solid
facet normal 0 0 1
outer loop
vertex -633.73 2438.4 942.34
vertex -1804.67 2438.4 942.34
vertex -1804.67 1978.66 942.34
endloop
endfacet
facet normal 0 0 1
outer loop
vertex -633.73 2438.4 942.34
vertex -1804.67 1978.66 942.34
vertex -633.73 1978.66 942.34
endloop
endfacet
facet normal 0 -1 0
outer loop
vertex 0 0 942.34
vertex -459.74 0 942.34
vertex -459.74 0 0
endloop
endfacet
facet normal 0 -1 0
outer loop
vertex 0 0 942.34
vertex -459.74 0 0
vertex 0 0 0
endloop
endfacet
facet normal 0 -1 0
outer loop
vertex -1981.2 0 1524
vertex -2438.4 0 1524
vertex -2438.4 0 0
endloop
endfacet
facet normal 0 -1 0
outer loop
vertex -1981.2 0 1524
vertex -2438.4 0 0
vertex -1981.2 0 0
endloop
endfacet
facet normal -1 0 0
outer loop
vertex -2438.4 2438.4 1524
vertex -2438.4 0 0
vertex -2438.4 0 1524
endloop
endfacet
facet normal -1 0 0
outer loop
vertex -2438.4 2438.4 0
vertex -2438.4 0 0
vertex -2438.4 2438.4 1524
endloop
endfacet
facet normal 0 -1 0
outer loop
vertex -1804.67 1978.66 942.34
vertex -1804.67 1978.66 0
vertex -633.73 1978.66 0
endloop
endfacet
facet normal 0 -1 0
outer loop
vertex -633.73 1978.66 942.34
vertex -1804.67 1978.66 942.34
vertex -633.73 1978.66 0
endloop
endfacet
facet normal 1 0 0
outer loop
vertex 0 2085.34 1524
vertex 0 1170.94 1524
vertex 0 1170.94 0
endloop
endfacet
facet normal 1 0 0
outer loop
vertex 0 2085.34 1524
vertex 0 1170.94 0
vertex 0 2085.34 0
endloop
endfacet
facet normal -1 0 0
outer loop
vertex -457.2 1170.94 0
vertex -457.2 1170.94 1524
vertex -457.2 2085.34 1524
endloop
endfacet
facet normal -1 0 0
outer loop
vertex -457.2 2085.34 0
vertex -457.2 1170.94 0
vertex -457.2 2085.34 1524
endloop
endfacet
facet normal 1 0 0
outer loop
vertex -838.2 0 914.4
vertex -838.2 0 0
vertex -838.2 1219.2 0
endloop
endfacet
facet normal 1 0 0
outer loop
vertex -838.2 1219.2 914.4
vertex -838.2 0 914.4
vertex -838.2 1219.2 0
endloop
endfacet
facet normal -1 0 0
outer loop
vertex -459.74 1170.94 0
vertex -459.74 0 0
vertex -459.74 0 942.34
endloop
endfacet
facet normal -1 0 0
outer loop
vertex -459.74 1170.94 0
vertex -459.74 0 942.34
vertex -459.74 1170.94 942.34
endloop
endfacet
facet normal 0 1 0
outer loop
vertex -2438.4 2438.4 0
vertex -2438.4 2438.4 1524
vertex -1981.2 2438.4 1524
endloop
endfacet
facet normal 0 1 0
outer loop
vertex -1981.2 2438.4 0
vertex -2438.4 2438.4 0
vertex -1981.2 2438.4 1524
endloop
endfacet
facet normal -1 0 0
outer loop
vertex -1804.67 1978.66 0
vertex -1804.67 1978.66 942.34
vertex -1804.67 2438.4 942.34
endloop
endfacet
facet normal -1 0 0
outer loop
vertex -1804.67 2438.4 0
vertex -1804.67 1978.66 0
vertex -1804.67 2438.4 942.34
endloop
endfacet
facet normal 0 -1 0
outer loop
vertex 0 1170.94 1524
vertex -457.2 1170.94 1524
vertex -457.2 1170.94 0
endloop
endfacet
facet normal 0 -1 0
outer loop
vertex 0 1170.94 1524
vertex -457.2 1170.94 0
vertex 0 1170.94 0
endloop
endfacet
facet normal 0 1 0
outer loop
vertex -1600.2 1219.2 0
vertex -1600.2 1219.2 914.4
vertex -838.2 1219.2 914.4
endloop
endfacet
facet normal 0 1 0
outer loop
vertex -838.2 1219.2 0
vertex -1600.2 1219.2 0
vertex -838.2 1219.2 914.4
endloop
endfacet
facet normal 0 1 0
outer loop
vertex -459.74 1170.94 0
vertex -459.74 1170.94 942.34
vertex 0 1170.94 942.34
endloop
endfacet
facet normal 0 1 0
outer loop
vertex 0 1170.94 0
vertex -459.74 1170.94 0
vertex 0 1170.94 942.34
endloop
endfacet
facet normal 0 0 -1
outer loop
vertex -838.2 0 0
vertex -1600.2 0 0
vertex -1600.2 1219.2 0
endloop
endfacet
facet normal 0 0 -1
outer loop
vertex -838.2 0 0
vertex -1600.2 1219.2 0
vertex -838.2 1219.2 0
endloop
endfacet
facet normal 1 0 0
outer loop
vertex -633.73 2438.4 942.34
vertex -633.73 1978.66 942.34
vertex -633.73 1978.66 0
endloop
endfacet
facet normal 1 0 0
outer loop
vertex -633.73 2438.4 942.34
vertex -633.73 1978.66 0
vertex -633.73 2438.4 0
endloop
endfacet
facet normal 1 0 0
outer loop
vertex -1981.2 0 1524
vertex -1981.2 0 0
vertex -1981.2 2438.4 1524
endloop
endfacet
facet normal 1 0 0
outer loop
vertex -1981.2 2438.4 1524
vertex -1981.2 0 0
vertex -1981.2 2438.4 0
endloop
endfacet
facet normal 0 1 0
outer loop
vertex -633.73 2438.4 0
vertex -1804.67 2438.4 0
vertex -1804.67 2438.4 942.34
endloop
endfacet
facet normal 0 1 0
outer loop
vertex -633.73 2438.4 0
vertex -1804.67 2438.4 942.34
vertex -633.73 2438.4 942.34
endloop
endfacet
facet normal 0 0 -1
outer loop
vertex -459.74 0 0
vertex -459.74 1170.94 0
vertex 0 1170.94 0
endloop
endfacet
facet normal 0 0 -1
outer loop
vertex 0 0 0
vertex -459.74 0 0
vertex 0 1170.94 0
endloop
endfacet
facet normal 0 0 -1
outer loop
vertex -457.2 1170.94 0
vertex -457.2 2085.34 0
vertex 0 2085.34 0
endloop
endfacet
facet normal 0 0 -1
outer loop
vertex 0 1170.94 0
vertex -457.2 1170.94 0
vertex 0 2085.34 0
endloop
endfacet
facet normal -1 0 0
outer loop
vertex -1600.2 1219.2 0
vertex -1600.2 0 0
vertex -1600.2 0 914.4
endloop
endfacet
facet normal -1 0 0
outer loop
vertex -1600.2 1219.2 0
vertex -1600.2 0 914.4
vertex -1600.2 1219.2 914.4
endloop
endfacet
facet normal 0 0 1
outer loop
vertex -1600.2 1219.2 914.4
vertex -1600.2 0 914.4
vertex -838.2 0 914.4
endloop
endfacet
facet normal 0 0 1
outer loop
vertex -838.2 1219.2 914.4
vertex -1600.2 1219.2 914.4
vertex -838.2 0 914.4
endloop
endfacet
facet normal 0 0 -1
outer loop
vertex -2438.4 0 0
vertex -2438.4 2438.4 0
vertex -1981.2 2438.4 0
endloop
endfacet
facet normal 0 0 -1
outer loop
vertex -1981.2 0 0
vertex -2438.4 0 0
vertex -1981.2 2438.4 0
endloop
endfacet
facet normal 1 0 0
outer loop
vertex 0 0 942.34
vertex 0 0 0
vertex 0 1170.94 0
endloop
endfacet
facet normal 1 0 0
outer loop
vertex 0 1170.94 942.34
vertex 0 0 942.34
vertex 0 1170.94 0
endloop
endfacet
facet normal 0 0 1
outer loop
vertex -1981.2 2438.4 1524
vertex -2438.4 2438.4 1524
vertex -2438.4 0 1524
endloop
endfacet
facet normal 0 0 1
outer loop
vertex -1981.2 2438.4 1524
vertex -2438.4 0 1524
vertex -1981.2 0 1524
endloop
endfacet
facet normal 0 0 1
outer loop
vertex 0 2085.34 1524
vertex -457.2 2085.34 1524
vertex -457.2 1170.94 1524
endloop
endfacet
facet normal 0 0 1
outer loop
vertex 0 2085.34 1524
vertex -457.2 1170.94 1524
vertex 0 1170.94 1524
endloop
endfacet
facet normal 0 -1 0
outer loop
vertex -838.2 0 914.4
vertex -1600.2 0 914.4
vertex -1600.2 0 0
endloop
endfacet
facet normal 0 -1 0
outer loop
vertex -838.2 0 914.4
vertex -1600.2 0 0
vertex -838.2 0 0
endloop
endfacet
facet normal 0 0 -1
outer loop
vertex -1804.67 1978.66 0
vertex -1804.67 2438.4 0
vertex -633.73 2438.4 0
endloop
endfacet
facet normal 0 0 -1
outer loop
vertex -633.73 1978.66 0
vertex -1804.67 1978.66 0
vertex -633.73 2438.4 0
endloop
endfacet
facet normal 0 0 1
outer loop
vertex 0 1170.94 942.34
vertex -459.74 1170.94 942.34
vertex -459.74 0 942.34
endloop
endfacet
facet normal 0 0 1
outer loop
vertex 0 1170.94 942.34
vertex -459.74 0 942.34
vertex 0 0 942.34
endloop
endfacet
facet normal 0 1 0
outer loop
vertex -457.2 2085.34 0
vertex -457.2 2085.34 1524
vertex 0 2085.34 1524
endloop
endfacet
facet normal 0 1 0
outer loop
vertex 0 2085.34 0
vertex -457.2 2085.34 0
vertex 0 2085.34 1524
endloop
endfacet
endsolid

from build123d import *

# Parameters (mm, degrees)
F0_W      = 457.2
F0_H      = 914.4
F1_DEPTH  = 1524
F2_W      = 457.2
F2_H      = 1524
F3_DEPTH  = 1524
F4_W      = 459.74
F4_H      = 1170.94
F5_DEPTH  = 942.34
F6_W      = 762
F6_H      = 1219.2
F7_DEPTH  = 914.4
F8_W      = 1170.94
F8_H      = 459.74
F9_DEPTH  = 942.34
F10_W     = 457.2
F10_H     = 914.4
F11_DEPTH = 1524


with BuildPart() as f1:
    # F0 (on Top) → F1 (new body)
    with BuildSketch(Plane.XY):
        with Locations((-2209.8, 457.2)):
            Rectangle(F0_W, F0_H)
    extrude(amount=F1_DEPTH)

    # F2 (on Top) → F3 (join)
    with BuildSketch(Plane.XY):
        with Locations((-2209.8, 1676.4)):
            Rectangle(F2_W, F2_H)
    extrude(amount=F3_DEPTH)


with BuildPart() as f5:
    # F4 (on Top) → F5 (new body)
    with BuildSketch(Plane.XY):
        with Locations((-229.87, 585.47)):
            Rectangle(F4_W, F4_H)
    extrude(amount=F5_DEPTH)


with BuildPart() as f7:
    # F6 (on Top) → F7 (new body)
    with BuildSketch(Plane.XY):
        with Locations((-1219.2, 609.6)):
            Rectangle(F6_W, F6_H)
    extrude(amount=F7_DEPTH)


with BuildPart() as f9:
    # F8 (on Top) → F9 (new body)
    with BuildSketch(Plane.XY):
        with Locations((-1219.2, 2208.53)):
            Rectangle(F8_W, F8_H)
    extrude(amount=F9_DEPTH)


with BuildPart() as f11:
    # F10 (on Top) → F11 (new body)
    with BuildSketch(Plane.XY):
        with Locations((-228.6, 1628.14)):
            Rectangle(F10_W, F10_H)
    extrude(amount=F11_DEPTH)


solid = Compound([f1.part, f5.part, f7.part, f9.part, f11.part])
